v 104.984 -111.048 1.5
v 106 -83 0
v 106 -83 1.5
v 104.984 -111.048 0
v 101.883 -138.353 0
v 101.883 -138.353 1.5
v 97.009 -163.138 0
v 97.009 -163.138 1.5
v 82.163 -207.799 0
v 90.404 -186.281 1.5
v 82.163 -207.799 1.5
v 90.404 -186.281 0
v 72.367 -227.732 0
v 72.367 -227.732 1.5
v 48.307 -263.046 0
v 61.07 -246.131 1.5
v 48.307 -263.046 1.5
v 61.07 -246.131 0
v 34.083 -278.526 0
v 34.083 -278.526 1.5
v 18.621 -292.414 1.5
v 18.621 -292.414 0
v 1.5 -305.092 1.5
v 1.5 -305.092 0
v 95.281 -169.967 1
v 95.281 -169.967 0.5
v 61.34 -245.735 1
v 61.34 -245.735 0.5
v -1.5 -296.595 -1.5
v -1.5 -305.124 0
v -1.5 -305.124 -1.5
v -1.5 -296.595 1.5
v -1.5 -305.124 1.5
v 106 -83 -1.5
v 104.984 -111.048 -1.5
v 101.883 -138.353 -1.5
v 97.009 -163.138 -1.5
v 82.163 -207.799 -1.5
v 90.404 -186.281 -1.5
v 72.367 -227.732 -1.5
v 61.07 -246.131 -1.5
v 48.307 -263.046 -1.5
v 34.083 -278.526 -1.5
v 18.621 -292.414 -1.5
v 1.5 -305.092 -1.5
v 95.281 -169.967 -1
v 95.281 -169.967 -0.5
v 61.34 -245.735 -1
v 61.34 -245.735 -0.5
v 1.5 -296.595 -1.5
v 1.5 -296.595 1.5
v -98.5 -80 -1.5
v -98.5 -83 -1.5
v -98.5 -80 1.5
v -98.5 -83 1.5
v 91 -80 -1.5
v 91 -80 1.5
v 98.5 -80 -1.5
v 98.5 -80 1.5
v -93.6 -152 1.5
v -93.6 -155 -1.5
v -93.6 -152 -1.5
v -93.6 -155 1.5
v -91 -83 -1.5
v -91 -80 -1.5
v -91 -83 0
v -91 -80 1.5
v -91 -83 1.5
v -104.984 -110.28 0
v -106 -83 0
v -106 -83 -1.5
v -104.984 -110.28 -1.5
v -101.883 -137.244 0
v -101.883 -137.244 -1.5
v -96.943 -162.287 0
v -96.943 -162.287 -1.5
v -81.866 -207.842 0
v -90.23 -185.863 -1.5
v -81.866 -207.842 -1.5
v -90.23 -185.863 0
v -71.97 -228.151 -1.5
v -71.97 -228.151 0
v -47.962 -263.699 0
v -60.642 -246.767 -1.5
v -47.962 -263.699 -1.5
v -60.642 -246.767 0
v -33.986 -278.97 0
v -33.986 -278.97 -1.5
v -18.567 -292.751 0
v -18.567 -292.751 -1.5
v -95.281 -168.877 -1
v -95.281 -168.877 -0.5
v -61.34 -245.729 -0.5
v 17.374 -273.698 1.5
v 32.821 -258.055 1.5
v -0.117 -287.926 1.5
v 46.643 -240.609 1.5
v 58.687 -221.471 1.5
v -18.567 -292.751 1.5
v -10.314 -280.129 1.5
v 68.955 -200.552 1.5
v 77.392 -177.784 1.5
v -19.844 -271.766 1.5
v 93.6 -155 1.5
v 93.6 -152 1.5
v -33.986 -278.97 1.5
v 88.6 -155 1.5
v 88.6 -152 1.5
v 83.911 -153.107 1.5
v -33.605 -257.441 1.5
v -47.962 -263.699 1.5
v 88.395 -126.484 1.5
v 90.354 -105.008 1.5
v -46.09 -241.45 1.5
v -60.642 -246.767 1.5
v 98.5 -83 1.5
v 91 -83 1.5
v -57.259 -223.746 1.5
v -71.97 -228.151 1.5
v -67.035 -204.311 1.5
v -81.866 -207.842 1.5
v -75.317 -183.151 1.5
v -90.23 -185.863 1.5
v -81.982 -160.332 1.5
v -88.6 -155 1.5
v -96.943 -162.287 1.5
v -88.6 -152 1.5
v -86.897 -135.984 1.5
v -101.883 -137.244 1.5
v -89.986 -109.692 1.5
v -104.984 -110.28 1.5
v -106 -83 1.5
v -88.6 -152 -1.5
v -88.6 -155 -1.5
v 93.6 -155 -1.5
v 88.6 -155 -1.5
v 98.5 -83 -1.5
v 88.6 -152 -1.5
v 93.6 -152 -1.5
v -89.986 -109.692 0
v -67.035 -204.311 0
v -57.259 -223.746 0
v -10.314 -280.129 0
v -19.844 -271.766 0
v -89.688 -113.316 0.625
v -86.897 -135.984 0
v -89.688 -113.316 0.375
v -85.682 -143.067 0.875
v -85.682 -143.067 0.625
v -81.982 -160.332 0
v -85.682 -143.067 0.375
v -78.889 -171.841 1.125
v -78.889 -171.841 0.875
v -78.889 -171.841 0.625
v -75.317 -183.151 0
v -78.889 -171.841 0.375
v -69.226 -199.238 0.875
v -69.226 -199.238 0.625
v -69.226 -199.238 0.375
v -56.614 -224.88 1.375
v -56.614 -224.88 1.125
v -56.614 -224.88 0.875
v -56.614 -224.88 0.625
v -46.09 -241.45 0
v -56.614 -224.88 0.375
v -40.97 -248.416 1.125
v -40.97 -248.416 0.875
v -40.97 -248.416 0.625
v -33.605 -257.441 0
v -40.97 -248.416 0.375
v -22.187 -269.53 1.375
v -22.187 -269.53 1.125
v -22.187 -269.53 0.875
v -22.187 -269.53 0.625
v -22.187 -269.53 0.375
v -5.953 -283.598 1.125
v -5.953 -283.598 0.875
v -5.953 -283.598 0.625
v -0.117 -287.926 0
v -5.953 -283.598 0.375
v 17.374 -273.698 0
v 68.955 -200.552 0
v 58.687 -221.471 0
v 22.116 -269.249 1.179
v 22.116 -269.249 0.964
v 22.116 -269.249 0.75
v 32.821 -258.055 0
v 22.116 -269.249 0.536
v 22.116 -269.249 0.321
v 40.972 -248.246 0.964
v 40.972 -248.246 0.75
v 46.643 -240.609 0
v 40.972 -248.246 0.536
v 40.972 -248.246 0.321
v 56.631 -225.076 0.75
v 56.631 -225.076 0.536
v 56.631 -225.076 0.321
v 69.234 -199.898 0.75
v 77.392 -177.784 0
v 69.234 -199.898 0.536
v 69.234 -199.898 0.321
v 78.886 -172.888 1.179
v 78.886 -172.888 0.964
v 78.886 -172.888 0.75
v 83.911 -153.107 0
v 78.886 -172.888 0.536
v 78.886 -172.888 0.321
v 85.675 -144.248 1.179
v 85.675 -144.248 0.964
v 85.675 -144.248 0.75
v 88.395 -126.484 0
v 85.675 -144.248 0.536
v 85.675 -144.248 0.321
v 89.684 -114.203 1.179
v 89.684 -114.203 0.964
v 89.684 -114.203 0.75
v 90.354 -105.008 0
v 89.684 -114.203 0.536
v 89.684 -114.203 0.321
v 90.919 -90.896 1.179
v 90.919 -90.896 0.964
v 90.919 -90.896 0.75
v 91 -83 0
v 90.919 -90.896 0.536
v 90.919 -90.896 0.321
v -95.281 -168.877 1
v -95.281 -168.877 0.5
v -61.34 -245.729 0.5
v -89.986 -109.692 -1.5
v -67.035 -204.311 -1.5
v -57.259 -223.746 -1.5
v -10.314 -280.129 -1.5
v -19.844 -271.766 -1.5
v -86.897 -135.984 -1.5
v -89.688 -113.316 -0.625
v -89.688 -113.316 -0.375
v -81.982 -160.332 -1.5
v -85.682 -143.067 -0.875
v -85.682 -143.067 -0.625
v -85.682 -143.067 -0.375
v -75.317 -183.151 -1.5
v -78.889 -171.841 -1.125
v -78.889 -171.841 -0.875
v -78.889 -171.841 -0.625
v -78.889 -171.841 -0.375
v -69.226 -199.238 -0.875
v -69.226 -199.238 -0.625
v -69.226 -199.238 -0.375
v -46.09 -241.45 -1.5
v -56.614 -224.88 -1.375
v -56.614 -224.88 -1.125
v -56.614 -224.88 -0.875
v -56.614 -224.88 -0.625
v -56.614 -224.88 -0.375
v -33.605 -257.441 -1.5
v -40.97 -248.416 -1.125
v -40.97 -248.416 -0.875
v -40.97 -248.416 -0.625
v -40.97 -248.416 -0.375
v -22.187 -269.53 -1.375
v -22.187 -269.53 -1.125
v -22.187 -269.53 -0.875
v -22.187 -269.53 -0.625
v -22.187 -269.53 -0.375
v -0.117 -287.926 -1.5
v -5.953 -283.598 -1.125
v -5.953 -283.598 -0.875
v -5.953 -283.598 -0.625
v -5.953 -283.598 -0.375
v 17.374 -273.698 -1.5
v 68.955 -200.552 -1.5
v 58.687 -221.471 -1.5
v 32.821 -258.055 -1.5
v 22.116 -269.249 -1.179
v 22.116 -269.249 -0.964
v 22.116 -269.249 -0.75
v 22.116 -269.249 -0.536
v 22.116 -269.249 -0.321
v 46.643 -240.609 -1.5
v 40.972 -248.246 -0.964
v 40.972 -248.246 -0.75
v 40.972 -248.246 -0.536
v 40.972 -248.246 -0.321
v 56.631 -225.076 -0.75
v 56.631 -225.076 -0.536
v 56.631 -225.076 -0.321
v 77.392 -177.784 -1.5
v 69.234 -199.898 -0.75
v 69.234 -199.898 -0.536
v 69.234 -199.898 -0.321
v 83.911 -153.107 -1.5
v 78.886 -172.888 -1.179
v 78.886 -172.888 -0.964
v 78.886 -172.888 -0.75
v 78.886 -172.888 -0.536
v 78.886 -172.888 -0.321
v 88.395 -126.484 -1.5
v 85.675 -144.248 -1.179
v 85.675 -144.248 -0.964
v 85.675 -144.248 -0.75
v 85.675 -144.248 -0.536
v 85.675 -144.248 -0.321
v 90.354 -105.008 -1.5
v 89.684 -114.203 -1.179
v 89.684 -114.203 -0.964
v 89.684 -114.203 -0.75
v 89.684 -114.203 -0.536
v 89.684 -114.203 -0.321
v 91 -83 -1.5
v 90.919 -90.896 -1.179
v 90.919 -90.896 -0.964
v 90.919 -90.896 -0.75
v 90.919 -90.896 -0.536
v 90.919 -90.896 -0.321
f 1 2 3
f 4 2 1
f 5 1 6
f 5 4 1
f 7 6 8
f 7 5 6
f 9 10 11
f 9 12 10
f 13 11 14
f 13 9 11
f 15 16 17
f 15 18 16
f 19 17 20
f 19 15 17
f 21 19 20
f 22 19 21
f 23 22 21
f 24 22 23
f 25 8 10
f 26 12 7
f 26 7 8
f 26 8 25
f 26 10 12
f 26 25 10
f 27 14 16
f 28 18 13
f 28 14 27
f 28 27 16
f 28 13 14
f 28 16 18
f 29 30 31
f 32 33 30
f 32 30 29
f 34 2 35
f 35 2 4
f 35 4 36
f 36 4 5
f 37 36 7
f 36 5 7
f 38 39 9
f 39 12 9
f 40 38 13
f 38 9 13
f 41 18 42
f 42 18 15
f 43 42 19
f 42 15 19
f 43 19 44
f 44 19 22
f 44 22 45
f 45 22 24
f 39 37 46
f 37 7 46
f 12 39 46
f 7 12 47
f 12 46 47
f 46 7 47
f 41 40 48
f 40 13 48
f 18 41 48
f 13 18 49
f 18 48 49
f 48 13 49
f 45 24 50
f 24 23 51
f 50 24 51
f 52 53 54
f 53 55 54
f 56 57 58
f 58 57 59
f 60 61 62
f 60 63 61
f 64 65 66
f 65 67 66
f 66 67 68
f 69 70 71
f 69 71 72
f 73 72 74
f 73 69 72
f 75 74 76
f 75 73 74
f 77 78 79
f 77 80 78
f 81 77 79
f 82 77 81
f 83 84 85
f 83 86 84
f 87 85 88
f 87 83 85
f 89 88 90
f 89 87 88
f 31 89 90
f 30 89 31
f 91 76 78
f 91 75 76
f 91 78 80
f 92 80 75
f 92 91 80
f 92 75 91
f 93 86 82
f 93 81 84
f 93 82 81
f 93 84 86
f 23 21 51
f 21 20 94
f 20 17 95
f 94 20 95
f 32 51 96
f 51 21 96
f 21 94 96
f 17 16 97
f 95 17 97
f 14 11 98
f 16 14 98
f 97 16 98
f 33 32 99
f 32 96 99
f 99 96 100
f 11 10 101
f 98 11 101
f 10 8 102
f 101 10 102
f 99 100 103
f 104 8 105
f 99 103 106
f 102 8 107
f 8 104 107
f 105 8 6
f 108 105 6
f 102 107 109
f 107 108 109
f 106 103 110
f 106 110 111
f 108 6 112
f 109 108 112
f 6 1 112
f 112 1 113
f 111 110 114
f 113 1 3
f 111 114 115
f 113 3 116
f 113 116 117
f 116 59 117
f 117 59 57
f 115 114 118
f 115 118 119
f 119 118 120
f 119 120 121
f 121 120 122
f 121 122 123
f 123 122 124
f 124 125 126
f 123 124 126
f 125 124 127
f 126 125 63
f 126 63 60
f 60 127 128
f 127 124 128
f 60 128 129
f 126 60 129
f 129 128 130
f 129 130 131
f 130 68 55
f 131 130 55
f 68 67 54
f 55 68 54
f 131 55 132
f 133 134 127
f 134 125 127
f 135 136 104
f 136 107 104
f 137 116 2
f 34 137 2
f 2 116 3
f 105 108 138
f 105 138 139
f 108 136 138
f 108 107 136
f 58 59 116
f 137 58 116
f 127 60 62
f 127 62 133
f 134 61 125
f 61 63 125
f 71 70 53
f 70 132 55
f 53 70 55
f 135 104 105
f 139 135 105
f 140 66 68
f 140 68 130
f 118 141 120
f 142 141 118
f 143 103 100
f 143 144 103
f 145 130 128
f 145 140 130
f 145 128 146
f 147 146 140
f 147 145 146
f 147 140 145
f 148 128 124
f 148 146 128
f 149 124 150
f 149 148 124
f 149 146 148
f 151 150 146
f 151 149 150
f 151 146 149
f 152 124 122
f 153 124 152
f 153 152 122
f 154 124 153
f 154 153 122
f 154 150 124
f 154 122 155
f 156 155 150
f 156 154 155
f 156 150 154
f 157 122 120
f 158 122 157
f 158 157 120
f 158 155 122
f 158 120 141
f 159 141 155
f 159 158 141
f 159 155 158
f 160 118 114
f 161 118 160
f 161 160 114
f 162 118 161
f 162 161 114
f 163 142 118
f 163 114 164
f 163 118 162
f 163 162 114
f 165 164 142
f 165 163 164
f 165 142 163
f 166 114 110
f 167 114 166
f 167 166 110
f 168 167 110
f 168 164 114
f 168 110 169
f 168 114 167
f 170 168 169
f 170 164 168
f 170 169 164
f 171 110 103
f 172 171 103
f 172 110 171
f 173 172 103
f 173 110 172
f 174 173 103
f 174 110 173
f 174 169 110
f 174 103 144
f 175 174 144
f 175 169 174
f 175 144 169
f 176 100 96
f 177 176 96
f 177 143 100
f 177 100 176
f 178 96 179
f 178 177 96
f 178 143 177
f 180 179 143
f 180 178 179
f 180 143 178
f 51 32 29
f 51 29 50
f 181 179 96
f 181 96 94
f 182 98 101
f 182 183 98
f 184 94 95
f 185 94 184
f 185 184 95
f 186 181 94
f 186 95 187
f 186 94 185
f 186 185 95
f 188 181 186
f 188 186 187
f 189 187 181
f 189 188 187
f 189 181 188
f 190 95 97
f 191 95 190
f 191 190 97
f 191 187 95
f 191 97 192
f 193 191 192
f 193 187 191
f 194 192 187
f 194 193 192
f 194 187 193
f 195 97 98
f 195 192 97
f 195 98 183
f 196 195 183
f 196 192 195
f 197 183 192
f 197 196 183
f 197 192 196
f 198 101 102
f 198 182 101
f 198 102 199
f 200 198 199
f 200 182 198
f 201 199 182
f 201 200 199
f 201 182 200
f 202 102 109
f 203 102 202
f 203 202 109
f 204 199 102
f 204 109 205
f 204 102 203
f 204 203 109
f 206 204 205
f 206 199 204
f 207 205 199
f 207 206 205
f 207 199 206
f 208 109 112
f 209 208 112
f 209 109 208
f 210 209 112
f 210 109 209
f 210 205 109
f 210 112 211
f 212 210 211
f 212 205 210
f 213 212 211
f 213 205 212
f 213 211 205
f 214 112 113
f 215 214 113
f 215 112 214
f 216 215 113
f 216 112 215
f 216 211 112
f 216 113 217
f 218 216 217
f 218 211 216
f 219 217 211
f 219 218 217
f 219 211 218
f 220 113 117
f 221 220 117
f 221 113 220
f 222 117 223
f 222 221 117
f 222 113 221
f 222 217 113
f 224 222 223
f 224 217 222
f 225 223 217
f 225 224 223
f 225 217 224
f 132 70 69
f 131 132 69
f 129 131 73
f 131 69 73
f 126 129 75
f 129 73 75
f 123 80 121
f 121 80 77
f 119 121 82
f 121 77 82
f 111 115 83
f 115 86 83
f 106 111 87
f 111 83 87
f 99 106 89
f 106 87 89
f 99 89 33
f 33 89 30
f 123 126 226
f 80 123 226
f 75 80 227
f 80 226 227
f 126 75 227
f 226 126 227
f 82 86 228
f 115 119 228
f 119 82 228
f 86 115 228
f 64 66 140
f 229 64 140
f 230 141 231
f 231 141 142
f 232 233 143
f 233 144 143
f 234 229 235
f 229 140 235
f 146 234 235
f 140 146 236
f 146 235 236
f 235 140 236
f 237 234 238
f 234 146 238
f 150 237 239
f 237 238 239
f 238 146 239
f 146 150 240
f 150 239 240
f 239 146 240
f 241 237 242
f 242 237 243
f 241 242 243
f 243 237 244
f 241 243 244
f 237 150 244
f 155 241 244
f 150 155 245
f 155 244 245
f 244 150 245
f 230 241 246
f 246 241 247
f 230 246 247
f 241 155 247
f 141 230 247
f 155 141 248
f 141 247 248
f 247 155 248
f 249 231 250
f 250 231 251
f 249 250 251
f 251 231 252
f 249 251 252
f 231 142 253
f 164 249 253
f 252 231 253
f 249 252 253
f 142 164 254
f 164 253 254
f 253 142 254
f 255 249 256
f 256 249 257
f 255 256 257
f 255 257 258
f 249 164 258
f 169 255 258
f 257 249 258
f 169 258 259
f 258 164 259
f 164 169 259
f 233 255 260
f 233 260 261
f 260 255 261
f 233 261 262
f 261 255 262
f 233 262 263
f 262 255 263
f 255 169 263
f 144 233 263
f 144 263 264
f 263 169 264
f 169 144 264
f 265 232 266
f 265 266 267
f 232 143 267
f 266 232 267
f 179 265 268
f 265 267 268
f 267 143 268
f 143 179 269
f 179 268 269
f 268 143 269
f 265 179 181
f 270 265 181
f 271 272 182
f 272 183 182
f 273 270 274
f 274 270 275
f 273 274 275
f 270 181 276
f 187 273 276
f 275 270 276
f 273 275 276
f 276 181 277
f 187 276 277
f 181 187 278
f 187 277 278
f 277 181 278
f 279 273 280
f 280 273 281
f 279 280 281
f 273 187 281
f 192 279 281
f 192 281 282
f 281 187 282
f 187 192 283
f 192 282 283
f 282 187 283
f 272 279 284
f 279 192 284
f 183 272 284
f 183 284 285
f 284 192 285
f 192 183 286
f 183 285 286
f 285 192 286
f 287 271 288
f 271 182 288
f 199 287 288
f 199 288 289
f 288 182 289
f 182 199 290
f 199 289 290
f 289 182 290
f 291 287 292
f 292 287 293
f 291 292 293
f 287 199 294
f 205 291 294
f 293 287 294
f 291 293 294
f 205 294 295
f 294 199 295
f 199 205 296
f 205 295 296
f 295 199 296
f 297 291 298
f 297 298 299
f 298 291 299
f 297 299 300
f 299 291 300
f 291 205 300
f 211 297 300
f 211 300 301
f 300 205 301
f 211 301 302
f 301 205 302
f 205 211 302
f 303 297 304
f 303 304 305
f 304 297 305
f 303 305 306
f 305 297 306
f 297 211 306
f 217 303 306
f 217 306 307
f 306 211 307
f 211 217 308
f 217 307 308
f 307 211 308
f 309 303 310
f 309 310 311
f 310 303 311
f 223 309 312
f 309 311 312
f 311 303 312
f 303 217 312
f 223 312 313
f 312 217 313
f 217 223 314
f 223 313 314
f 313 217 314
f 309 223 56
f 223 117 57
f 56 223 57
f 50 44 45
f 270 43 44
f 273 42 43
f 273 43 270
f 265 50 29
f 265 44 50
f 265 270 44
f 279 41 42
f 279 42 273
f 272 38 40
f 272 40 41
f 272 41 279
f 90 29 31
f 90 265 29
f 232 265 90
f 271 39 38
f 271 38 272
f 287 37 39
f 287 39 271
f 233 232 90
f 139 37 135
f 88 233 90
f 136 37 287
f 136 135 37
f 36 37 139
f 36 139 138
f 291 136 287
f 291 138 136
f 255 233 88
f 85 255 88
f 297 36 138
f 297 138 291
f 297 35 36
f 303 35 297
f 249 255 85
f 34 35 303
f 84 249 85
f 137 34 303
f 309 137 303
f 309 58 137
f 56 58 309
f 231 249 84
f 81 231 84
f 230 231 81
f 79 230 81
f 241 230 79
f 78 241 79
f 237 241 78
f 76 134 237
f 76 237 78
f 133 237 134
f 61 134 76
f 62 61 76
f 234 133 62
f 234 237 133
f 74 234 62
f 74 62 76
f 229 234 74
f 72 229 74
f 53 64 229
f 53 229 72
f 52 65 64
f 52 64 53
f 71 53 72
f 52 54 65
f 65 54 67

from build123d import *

# Parameters (mm, degrees)
SKETCH1_W           = 5
SKETCH1_H           = 3
BOSS_EXTRUDE1_DEPTH = 1.5
SKETCH2_W           = 3
SKETCH2_H           = 9.494035225
CUT_EXTRUDE1_DEPTH  = 3


with BuildPart() as part:
    # Sketch1 → Boss-Extrude1 (new body, symmetric)
    with BuildSketch(Plane.XY):
        with BuildLine():
            Line((-106, -83), (-98.5, -83))
            Line((-98.5, -83), (-98.5, -80))
            Line((-98.5, -80), (-91, -80))
            Line((-91, -80), (-91, -83))
            add(Edge.make_bspline(
                [(-91, -83), (-91, -88.068550738), (-90.784224976, -98.220481237), (-89.47168793, -118.377767283), (-86.146815138, -143.230800288), (-79.368059247, -172.071120857), (-69.71738881, -199.531988744), (-57.11831244, -225.231718508), (-44.09611353, -244.888891231), (-32.112008882, -259.401886537), (-22.324804426, -269.642683196), (-13.481107719, -277.613388782), (-5.992695326, -283.625797901), (-2.089373231, -286.521065709), (-0.116739636, -287.926353347)],
                knots=[0, 0, 0, 0, 0.059983469, 0.119966937, 0.239933875, 0.359900812, 0.47986775, 0.599834687, 0.719801625, 0.779785093, 0.839768562, 0.899752031, 0.929743765, 0.9597355, 0.9597355, 0.9597355, 0.9597355], degree=3))
            add(Edge.make_bspline(
                [(-0.116739636, -287.926353347), (1.870810321, -286.480217138), (5.811438827, -283.506382084), (13.355962702, -277.384642576), (22.257609381, -269.345287034), (32.090104581, -259.121737951), (44.109675826, -244.741072781), (57.139620096, -225.411627313), (69.725154077, -200.204558319), (79.363006417, -173.160517049), (85.009288933, -149.261906753), (88.135960803, -129.439309105), (89.796426225, -114.252560891), (90.618872692, -101.350995082), (90.945843548, -90.910045133), (91, -85.632026579), (91, -83)],
                knots=[0, 0, 0, 0, 0.030008035, 0.060016069, 0.120032138, 0.180048207, 0.240064276, 0.360096414, 0.480128553, 0.600160691, 0.720192829, 0.780208898, 0.840224967, 0.900241036, 0.930249071, 0.960257105, 0.960257105, 0.960257105, 0.960257105], degree=3))
            Line((91, -83), (91, -80))
            Line((91, -80), (98.5, -80))
            Line((98.5, -80), (98.5, -83))
            Line((98.5, -83), (106, -83))
            add(Edge.make_bspline(
                [(106, -83), (106, -174.443319162), (74.762940933, -256.782973383), (0, -306.089272366)],
                knots=[0, 0, 0, 0, 1, 1, 1, 1], degree=3))
            add(Edge.make_bspline(
                [(-106, -83), (-106, -171.171703536), (-74.762940933, -258.439171974), (0, -306.089272366)],
                knots=[0, 0, 0, 0, 1, 1, 1, 1], degree=3))
        make_face()
        with Locations((-91.1, -153.5)):
            Rectangle(SKETCH1_W, SKETCH1_H, mode=Mode.SUBTRACT)
        with Locations((91.1, -153.5)):
            Rectangle(SKETCH1_W, SKETCH1_H, mode=Mode.SUBTRACT)
    extrude(amount=BOSS_EXTRUDE1_DEPTH, both=True)

    # Sketch2 → Cut-Extrude1 (cut)
    with BuildSketch(Plane.XY.offset(1.5)):
        with Locations((0, -301.342254754)):
            Rectangle(SKETCH2_W, SKETCH2_H)
    extrude(amount=-CUT_EXTRUDE1_DEPTH, mode=Mode.SUBTRACT)


solid = part.part
